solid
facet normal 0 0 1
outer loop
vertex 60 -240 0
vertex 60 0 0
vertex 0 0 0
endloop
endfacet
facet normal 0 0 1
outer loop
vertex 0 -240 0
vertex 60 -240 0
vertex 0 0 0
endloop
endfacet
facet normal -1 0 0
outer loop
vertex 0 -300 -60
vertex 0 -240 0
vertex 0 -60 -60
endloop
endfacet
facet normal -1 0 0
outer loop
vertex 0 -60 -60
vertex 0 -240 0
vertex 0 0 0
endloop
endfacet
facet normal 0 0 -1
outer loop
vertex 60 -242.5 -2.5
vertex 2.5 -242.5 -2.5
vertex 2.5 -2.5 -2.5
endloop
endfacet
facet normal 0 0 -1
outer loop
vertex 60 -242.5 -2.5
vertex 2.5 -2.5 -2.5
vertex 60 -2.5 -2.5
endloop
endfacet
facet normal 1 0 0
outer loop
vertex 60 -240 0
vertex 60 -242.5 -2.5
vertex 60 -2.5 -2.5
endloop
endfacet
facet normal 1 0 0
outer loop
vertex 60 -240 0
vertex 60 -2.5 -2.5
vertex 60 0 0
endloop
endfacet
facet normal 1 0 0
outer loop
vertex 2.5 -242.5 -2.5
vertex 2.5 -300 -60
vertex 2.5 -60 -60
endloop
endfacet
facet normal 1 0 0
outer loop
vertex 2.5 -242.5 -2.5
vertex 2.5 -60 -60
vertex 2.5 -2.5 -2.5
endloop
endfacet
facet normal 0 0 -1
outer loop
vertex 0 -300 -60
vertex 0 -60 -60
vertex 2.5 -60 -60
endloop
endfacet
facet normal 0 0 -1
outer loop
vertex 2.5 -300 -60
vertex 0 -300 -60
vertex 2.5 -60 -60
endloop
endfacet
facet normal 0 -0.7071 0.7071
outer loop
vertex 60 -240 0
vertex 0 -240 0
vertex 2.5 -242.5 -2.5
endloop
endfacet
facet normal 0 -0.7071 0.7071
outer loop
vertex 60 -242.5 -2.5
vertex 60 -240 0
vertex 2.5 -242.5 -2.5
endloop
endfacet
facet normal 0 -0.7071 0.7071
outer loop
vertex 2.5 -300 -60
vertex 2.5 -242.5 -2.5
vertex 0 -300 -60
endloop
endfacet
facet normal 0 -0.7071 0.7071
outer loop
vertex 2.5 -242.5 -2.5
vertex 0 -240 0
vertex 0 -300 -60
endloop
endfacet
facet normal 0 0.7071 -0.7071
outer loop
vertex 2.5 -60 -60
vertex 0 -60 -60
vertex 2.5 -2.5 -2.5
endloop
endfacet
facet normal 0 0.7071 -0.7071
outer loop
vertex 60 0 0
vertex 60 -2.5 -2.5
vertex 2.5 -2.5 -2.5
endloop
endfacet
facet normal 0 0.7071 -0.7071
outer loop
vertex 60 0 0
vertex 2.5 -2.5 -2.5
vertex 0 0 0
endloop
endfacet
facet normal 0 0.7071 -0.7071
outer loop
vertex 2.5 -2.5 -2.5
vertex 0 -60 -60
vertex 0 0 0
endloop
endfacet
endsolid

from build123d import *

# Parameters (mm, degrees)
F1_DEPTH = 300
F3_DEPTH = 60.001
F5_DEPTH = 60.001


with BuildPart() as f1:
    # F0 (on Front) → F1 (new body)
    with BuildSketch(Plane.XZ):
        Polygon((60, 0), (0, 0), (0, -60), (2.5, -60), (2.5, -2.5), (60, -2.5), align=None)
    extrude(amount=F1_DEPTH)

    # F2 (on face) → F3 (cut, through all)
    with BuildSketch(Plane(origin=(0, 0, 0), x_dir=(0, -1, 0), z_dir=(-1, 0, 0))):
        Polygon((0, 0), (0, -60), (60, -60), align=None)
    extrude(amount=-F3_DEPTH, mode=Mode.SUBTRACT)

    # F4 (on face) → F5 (cut, through all)
    with BuildSketch(Plane(origin=(0, 0, 0), x_dir=(0, -1, 0), z_dir=(-1, 0, 0))):
        Polygon((240, 0), (300, -60), (300, 0), align=None)
    extrude(amount=-F5_DEPTH, mode=Mode.SUBTRACT)


solid = f1.part
